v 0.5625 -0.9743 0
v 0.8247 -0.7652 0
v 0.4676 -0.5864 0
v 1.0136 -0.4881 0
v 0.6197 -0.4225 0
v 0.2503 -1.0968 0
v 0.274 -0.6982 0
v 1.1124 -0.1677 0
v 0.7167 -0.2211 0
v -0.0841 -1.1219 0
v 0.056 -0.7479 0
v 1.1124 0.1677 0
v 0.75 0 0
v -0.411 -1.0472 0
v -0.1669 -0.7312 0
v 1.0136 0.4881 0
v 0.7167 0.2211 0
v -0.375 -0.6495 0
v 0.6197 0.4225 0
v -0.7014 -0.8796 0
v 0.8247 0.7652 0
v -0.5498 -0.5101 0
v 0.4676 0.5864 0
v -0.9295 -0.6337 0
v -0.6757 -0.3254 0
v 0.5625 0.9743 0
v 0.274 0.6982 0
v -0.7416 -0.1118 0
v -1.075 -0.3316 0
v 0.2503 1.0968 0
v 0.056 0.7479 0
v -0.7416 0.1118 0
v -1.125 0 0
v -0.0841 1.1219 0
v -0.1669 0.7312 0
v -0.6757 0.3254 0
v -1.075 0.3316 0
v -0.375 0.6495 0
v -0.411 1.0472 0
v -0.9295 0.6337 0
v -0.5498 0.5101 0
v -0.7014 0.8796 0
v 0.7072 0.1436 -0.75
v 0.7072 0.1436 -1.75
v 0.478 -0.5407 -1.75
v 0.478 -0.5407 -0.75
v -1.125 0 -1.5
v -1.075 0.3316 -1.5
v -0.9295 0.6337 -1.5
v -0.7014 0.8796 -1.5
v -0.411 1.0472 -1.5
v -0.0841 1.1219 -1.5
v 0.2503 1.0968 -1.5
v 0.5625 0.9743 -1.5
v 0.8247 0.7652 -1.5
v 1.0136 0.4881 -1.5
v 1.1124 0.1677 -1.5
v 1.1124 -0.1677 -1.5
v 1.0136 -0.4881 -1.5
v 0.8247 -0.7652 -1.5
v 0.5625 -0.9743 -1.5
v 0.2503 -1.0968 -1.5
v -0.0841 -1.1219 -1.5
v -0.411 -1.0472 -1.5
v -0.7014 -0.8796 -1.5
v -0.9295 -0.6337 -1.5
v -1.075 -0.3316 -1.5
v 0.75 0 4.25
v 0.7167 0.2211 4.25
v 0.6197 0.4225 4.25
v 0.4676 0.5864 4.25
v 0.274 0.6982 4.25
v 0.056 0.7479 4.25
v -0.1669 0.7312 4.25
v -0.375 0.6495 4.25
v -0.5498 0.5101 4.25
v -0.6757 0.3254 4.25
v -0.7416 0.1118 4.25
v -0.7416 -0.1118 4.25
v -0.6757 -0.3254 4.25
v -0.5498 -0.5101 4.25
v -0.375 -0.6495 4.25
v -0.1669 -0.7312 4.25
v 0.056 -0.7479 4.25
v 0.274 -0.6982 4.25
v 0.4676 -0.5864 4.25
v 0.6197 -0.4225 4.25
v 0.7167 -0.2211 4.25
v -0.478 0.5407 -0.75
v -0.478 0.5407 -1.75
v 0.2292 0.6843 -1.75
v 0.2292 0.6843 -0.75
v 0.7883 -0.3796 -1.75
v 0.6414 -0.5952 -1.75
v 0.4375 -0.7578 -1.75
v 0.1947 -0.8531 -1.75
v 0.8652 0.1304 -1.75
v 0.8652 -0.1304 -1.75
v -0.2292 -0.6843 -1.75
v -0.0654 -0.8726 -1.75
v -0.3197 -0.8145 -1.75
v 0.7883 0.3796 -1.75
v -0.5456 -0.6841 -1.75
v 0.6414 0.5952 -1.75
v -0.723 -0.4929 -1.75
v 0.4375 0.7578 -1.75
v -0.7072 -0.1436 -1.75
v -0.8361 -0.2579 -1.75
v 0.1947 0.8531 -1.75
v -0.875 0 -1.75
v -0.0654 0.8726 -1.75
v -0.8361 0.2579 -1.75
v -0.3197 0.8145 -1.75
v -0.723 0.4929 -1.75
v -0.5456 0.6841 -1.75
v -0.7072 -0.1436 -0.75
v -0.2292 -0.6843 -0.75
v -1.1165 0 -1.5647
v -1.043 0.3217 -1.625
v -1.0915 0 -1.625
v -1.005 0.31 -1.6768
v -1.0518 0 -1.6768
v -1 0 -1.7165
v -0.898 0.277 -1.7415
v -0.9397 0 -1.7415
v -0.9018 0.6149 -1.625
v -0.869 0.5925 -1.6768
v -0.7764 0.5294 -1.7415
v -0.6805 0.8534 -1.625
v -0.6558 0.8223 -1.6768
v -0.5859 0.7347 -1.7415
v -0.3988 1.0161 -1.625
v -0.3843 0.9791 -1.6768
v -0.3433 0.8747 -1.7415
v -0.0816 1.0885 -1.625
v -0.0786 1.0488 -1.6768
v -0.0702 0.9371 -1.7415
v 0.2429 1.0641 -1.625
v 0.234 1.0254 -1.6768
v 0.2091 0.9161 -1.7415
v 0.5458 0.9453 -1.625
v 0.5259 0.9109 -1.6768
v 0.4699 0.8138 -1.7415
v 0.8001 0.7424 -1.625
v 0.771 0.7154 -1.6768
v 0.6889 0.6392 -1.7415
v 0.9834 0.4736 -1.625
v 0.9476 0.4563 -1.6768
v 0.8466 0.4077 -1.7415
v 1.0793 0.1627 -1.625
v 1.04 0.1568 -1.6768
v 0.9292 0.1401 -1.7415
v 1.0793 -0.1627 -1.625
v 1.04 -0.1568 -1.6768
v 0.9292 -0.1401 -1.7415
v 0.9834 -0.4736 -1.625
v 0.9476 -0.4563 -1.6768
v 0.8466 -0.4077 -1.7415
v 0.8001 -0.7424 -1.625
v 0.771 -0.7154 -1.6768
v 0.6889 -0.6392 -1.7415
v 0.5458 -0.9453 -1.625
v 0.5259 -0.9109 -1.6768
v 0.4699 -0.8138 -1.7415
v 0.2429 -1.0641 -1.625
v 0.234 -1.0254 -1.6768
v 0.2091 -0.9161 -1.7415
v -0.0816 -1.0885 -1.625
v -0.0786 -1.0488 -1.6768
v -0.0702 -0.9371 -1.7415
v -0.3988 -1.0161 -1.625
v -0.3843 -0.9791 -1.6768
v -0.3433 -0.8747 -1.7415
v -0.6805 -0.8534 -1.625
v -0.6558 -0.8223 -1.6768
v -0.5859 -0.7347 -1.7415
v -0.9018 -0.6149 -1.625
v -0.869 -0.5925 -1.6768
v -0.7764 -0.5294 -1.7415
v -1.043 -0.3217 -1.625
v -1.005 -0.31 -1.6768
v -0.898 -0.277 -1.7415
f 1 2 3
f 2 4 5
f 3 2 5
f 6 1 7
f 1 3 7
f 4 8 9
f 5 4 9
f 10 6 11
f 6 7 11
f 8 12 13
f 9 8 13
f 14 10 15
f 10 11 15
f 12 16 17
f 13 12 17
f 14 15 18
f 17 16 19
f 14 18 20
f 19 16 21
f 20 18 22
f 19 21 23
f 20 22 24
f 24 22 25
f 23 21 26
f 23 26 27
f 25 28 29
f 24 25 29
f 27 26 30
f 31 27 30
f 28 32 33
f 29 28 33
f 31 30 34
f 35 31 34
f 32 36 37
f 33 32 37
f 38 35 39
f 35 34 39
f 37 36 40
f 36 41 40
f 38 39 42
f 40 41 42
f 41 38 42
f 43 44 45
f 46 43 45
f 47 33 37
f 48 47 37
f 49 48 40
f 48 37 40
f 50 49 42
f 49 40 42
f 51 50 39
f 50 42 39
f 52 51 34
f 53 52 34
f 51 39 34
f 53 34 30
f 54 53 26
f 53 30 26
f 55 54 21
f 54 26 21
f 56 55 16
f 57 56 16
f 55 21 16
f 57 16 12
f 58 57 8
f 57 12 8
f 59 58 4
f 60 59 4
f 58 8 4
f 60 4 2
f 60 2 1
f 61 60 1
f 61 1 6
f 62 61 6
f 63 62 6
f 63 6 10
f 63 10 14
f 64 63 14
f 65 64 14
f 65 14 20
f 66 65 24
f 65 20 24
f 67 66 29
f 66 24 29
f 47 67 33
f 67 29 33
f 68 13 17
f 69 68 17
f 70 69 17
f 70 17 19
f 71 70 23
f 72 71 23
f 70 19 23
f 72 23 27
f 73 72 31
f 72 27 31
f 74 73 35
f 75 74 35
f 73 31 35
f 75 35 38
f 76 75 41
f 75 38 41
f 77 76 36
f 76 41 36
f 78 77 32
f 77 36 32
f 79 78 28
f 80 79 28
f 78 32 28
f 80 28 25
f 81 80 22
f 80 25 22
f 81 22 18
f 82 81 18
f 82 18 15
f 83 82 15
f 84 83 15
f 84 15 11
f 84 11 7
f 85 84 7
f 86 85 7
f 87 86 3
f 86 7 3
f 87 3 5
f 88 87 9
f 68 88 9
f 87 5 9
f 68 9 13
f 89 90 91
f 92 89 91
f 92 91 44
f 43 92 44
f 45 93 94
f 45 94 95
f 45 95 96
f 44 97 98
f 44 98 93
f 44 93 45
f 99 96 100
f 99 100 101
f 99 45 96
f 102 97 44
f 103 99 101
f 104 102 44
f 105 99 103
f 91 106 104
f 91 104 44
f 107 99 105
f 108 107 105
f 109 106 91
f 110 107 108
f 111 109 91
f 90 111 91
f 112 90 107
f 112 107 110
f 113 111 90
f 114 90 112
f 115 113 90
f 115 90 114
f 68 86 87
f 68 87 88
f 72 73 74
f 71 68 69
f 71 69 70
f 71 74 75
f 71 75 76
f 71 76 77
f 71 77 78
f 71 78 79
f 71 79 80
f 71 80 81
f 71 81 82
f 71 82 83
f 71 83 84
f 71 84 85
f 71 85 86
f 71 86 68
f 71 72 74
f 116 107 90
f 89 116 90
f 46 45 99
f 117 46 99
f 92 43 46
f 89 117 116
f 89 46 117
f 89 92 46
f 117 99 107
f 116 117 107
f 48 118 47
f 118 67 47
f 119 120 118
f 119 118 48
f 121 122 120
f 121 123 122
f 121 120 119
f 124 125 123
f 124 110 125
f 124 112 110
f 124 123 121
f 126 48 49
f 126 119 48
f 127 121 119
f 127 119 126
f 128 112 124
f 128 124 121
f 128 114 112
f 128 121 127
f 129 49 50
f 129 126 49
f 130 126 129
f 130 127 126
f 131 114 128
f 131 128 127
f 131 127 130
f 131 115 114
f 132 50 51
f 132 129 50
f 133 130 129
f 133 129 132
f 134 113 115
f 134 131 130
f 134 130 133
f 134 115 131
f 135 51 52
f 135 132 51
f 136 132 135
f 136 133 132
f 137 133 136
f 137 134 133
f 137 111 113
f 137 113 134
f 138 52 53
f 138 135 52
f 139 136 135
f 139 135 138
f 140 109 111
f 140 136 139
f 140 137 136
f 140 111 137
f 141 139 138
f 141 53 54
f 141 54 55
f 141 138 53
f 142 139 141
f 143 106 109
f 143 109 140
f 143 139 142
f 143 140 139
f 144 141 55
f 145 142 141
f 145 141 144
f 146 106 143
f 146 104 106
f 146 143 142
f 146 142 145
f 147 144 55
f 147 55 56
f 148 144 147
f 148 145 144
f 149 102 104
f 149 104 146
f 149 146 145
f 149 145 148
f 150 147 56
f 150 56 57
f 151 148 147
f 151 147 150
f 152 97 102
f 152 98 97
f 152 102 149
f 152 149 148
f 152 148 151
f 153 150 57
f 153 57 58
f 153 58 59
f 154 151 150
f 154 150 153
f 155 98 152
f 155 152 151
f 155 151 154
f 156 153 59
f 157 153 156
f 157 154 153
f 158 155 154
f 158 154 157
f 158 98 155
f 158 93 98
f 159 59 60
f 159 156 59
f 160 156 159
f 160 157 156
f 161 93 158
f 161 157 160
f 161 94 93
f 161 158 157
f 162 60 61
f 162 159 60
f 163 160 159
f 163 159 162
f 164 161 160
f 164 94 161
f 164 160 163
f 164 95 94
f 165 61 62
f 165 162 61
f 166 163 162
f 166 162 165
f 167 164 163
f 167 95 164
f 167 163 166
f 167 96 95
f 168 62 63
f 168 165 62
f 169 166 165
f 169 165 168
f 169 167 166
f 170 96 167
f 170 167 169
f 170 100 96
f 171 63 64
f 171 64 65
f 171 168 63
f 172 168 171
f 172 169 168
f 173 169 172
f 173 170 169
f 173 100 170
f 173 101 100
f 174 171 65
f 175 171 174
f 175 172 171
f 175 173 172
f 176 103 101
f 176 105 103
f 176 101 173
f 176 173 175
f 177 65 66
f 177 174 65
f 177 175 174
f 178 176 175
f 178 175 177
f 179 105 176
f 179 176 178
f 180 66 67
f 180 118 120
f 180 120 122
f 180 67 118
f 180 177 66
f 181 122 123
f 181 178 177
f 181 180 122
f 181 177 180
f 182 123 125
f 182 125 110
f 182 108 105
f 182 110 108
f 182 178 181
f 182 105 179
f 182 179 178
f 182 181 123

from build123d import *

# Parameters (mm, degrees)
SKETCH1_R           = 0.75
BOSS_EXTRUDE1_DEPTH = 4.25
SKETCH2_R           = 1.125
BOSS_EXTRUDE2_DEPTH = 1.75
FILLET1_R           = 0.25
CUT_EXTRUDE1_DEPTH  = 1


with BuildPart() as part:
    # Sketch1 → Boss-Extrude1 (new body)
    with BuildSketch(Plane.XY):
        Circle(SKETCH1_R)
    extrude(amount=BOSS_EXTRUDE1_DEPTH)

    # Sketch2 → Boss-Extrude2 (add)
    with BuildSketch(Plane(origin=(0, 0, 0), x_dir=(-1, 0, 0), z_dir=(0, 0, -1))):
        Circle(SKETCH2_R)
    extrude(amount=BOSS_EXTRUDE2_DEPTH)

    # Fillet1
    fillet1_edges = [part.edges().sort_by_distance(p)[0] for p in [
        (1.125, 0, -1.75),
    ]]
    fillet(fillet1_edges, radius=FILLET1_R)

    # Sketch3 → Cut-Extrude1 (cut)
    with BuildSketch(Plane(origin=(0, 0, -1.75), x_dir=(-1, 0, 0), z_dir=(0, 0, -1))):
        Polygon((0.229233643, -0.684313722), (0.707249889, -0.143634703), (0.478016246, 0.540679019), (-0.229233643, 0.684313722), (-0.707249889, 0.143634703), (-0.478016246, -0.540679019), align=None)
    extrude(amount=-CUT_EXTRUDE1_DEPTH, mode=Mode.SUBTRACT)


solid = part.part
